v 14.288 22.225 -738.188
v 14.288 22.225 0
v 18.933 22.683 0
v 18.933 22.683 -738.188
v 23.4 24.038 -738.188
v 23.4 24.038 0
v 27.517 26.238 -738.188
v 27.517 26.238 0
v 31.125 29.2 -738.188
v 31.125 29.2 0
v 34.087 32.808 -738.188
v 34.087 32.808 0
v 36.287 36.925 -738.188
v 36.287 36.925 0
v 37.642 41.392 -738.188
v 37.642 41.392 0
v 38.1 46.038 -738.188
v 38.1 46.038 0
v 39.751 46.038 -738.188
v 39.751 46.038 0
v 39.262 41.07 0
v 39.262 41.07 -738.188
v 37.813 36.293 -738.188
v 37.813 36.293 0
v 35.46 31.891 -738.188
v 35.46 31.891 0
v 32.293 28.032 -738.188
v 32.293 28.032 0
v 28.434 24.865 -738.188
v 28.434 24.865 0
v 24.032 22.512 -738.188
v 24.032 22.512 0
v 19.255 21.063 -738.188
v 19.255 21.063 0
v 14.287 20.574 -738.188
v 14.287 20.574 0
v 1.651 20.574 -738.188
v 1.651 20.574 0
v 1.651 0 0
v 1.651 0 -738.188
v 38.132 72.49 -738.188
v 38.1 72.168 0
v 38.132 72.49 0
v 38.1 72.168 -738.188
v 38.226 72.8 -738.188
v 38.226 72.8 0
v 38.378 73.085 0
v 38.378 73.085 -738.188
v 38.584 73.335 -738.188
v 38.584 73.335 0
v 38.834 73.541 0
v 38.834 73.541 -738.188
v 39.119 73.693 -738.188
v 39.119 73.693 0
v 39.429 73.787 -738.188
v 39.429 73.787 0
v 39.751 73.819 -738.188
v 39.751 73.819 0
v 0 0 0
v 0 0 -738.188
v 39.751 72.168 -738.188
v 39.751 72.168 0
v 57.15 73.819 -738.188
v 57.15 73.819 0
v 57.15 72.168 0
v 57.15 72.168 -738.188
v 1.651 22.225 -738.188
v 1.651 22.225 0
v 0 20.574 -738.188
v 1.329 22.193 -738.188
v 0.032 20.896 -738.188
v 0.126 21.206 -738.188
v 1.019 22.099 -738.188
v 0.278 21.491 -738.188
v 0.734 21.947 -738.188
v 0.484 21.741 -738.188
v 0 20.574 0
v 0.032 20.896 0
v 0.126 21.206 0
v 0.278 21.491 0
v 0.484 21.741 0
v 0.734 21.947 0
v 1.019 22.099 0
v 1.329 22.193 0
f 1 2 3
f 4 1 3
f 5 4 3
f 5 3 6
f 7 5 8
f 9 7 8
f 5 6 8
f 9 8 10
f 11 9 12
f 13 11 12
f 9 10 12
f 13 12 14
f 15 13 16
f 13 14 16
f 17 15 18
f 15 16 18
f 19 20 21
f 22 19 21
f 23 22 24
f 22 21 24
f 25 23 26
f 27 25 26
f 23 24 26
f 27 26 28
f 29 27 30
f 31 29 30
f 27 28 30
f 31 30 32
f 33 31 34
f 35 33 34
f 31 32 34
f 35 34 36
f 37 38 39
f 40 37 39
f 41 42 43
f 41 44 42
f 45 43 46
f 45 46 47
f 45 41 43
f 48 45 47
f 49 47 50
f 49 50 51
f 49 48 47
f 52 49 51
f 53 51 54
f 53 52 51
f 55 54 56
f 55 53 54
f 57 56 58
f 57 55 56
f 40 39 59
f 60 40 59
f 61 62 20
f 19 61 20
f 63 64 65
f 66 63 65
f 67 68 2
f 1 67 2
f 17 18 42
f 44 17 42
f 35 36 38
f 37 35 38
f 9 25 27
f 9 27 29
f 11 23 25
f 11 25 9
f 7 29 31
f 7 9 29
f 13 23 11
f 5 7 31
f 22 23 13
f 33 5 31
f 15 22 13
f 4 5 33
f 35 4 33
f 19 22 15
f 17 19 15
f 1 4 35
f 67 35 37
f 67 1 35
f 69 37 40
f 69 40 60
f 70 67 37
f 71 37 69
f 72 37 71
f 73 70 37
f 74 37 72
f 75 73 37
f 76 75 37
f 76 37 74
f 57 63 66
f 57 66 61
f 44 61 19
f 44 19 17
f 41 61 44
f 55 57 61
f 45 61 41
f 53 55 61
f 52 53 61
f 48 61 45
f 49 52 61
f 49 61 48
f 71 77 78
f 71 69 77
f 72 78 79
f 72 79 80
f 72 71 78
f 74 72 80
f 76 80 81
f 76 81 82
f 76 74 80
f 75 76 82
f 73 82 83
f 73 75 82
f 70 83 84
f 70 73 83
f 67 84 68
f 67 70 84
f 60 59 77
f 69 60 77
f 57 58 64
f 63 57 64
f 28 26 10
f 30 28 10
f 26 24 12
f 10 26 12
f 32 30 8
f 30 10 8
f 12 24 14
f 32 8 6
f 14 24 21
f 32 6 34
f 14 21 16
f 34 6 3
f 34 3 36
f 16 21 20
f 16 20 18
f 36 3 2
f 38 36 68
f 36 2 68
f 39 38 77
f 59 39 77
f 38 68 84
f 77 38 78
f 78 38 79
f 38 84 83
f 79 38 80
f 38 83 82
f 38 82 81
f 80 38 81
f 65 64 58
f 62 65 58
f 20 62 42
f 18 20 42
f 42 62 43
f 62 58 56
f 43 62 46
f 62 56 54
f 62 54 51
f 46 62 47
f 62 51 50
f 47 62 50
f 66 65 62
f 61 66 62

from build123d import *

# Parameters (mm, degrees)
EXTRUDE_THIN1_DEPTH = 738.1875
FILLET1_R           = 1.651


with BuildPart() as part:
    # Sketch1 → Extrude-Thin1 (new body)
    with BuildSketch(Plane.XY):
        with BuildLine():
            Line((0, 0), (0, 22.225))
            Line((0, 22.225), (14.2875, 22.225))
            ThreePointArc((14.2875, 22.225), (31.125480227, 29.199519773), (38.1, 46.0375))
            Line((38.1, 46.0375), (38.1, 73.81875))
            Line((38.1, 73.81875), (57.15, 73.81875))
            Line((57.15, 73.81875), (57.15, 72.16775))
            Line((57.15, 72.16775), (39.751, 72.16775))
            Line((39.751, 72.16775), (39.751, 46.0375))
            ThreePointArc((39.751, 46.0375), (32.292913523, 28.032086477), (14.2875, 20.574))
            Line((14.2875, 20.574), (1.651, 20.574))
            Line((1.651, 20.574), (1.651, 0))
            Line((1.651, 0), (0, 0))
        make_face()
    extrude(amount=-EXTRUDE_THIN1_DEPTH)

    # Fillet1
    fillet1_edges = [part.edges().sort_by_distance(p)[0] for p in [
        (0, 22.225, -369.09375),
        (38.1, 73.81875, -369.09375),
    ]]
    fillet(fillet1_edges, radius=FILLET1_R)


solid = part.part
